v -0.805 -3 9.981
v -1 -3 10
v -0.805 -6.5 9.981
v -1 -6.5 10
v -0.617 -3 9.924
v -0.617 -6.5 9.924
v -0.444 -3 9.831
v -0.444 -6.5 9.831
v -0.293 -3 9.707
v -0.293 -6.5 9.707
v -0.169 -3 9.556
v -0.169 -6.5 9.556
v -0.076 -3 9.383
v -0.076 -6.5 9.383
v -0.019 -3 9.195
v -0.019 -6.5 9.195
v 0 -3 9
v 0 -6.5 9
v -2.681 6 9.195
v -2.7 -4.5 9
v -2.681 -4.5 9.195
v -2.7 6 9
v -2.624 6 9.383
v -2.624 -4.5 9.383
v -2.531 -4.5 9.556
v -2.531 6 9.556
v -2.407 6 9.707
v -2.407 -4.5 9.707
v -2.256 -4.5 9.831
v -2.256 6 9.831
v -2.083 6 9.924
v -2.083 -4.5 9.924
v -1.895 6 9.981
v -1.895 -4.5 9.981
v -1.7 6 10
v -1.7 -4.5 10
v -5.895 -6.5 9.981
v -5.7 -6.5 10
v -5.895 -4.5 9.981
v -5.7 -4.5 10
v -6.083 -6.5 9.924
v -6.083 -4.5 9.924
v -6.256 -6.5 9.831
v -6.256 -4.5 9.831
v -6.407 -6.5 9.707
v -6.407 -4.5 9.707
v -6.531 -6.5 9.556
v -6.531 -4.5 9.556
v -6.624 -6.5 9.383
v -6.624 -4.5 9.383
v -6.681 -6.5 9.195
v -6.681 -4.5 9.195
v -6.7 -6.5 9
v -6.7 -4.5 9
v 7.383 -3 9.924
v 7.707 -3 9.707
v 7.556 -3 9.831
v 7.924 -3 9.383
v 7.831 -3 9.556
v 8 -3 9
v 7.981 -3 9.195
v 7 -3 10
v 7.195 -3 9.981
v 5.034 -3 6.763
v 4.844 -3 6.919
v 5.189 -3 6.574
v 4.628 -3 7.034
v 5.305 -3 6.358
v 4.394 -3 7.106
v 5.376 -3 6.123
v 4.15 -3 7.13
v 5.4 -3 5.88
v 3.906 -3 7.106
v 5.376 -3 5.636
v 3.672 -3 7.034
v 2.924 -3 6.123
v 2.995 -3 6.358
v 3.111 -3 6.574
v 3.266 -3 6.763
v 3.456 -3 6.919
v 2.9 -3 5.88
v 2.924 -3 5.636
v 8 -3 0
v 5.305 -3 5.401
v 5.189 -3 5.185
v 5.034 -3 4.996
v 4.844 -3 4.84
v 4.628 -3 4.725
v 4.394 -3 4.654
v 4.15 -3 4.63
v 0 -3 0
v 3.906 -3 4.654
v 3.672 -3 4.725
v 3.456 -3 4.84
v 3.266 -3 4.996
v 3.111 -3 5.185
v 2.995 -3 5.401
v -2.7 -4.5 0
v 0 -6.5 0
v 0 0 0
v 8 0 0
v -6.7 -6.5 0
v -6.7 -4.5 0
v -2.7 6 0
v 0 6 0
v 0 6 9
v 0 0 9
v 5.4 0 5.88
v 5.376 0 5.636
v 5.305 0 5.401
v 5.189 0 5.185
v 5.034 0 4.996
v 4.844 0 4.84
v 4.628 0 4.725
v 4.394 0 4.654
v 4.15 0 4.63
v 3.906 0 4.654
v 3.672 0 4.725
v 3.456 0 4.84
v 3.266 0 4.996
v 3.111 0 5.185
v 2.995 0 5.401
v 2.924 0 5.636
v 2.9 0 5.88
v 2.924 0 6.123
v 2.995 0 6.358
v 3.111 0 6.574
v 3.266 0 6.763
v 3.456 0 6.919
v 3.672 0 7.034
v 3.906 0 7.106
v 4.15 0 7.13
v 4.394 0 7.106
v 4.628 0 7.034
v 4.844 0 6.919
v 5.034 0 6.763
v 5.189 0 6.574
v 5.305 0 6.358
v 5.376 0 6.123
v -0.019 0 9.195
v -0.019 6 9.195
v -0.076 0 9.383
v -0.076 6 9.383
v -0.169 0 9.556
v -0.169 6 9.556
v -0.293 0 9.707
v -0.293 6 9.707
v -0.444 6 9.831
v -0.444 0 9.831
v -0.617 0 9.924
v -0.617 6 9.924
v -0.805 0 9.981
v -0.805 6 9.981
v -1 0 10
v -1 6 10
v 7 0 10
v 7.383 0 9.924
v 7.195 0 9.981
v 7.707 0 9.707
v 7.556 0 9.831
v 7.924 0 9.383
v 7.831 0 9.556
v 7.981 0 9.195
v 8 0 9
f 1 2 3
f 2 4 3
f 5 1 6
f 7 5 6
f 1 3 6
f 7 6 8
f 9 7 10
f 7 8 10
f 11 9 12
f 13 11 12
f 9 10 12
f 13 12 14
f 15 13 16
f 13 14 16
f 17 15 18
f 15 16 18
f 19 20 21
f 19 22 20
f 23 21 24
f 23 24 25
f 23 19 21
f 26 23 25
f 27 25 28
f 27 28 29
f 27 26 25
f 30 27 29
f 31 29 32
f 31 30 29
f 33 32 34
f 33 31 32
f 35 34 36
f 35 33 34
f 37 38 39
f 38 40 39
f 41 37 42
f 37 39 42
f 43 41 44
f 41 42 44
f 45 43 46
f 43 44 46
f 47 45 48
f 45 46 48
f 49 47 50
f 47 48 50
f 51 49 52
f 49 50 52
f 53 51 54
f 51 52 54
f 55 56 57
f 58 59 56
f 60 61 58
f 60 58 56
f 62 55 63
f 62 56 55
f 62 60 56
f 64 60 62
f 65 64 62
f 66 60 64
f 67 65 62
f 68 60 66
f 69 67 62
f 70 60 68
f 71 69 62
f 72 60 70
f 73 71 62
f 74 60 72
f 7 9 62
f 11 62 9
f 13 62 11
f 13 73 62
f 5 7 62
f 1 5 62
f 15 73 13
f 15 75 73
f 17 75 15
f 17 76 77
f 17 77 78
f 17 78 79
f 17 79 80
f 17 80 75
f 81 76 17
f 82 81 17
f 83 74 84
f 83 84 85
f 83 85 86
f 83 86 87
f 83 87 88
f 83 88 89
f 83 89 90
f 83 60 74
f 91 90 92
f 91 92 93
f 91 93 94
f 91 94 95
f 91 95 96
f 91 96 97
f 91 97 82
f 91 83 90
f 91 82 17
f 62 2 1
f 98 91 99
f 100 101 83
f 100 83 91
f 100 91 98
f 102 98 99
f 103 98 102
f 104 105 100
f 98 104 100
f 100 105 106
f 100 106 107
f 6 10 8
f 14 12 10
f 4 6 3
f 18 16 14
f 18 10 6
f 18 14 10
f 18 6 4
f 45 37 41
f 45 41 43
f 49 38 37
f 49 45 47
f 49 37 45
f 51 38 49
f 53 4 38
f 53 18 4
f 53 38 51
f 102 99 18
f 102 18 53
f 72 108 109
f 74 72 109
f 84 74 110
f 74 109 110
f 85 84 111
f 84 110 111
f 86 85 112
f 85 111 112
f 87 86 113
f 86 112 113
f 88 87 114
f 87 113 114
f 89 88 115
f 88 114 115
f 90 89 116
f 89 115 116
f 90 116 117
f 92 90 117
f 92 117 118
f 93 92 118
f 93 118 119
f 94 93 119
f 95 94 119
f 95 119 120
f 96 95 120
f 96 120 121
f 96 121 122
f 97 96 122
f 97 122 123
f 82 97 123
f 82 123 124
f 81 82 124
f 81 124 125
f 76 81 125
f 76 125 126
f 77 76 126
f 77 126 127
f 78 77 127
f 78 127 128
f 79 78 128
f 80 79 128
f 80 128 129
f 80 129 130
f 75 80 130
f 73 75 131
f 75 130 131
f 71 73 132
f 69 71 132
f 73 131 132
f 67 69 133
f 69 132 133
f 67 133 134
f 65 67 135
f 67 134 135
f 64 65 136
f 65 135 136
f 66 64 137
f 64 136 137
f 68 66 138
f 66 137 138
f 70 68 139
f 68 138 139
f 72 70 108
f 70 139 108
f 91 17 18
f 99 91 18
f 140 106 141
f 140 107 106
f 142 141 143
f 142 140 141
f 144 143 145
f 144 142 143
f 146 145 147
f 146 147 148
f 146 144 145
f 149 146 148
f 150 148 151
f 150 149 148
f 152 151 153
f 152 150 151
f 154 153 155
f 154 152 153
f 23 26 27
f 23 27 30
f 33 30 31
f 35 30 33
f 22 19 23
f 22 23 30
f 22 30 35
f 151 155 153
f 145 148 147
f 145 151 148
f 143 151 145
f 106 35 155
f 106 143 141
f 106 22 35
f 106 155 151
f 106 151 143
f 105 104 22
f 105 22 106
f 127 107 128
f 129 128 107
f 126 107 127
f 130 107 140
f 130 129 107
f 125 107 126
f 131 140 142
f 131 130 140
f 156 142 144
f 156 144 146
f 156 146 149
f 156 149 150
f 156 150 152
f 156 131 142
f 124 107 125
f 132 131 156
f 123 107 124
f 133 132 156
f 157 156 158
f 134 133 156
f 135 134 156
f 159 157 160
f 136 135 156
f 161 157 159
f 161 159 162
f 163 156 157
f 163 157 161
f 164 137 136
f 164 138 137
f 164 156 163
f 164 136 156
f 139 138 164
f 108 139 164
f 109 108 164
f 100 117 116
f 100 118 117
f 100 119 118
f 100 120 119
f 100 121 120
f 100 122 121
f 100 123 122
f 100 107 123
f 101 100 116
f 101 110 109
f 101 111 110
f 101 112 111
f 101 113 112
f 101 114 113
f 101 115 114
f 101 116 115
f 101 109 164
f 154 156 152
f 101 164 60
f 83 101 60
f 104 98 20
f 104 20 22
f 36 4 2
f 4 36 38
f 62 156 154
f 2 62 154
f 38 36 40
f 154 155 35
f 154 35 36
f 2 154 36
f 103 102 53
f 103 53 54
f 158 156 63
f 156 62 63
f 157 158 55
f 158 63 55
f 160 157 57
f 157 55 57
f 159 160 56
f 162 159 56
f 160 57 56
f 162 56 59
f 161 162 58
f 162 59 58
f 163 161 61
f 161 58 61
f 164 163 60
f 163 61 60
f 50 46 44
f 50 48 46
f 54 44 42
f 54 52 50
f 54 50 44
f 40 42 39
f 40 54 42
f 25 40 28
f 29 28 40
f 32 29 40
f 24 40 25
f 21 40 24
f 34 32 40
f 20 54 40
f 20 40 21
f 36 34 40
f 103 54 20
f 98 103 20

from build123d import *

# Parameters (mm, degrees)
AUFSATZ_LINEAR_AUSTRAGEN1_DEPTH      = 10
F_2_5_2_5_DURCHMESSER_BOHRUNG1_D     = 2.5
F_2_5_2_5_DURCHMESSER_BOHRUNG1_DEPTH = 5
F_2_5_2_5_DURCHMESSER_BOHRUNG1_TIP   = 0.751075774
VERRUNDUNG1_R                        = 1
VERRUNDUNG2_R                        = 1


with BuildPart() as part:
    # Skizze1 → Aufsatz-Linear austragen1 (new body)
    with BuildSketch(Plane.XY):
        Polygon((-2.7, 6), (0, 6), (0, 0), (8, 0), (8, -3), (0, -3), (0, -6.5), (-6.7, -6.5), (-6.7, -4.5), (-2.7, -4.5), align=None)
    extrude(amount=AUFSATZ_LINEAR_AUSTRAGEN1_DEPTH)

    # Ø2.5 (2.5) Durchmesser Bohrung1
    with Locations(Plane(origin=(0, -3, 0), x_dir=(-1, 0, 0), z_dir=(0, -1, 0))):
        with Locations((-4.15, -5.879543152)):
            Hole(F_2_5_2_5_DURCHMESSER_BOHRUNG1_D / 2, depth=F_2_5_2_5_DURCHMESSER_BOHRUNG1_DEPTH)
            with Locations((0, 0, -(F_2_5_2_5_DURCHMESSER_BOHRUNG1_DEPTH + F_2_5_2_5_DURCHMESSER_BOHRUNG1_TIP / 2))):  # 118° drill point
                Cone(0, F_2_5_2_5_DURCHMESSER_BOHRUNG1_D / 2, F_2_5_2_5_DURCHMESSER_BOHRUNG1_TIP, mode=Mode.SUBTRACT)

    # Verrundung1
    verrundung1_edges = [part.edges().sort_by_distance(p)[0] for p in [
        (-6.7, -5.5, 10),
        (0, -4.75, 10),
        (8, -1.5, 10),
        (0, 3, 10),
    ]]
    fillet(verrundung1_edges, radius=VERRUNDUNG1_R)

    # Verrundung2
    verrundung2_edges = [part.edges().sort_by_distance(p)[0] for p in [
        (-2.7, 0.75, 10),
    ]]
    fillet(verrundung2_edges, radius=VERRUNDUNG2_R)


solid = part.part
